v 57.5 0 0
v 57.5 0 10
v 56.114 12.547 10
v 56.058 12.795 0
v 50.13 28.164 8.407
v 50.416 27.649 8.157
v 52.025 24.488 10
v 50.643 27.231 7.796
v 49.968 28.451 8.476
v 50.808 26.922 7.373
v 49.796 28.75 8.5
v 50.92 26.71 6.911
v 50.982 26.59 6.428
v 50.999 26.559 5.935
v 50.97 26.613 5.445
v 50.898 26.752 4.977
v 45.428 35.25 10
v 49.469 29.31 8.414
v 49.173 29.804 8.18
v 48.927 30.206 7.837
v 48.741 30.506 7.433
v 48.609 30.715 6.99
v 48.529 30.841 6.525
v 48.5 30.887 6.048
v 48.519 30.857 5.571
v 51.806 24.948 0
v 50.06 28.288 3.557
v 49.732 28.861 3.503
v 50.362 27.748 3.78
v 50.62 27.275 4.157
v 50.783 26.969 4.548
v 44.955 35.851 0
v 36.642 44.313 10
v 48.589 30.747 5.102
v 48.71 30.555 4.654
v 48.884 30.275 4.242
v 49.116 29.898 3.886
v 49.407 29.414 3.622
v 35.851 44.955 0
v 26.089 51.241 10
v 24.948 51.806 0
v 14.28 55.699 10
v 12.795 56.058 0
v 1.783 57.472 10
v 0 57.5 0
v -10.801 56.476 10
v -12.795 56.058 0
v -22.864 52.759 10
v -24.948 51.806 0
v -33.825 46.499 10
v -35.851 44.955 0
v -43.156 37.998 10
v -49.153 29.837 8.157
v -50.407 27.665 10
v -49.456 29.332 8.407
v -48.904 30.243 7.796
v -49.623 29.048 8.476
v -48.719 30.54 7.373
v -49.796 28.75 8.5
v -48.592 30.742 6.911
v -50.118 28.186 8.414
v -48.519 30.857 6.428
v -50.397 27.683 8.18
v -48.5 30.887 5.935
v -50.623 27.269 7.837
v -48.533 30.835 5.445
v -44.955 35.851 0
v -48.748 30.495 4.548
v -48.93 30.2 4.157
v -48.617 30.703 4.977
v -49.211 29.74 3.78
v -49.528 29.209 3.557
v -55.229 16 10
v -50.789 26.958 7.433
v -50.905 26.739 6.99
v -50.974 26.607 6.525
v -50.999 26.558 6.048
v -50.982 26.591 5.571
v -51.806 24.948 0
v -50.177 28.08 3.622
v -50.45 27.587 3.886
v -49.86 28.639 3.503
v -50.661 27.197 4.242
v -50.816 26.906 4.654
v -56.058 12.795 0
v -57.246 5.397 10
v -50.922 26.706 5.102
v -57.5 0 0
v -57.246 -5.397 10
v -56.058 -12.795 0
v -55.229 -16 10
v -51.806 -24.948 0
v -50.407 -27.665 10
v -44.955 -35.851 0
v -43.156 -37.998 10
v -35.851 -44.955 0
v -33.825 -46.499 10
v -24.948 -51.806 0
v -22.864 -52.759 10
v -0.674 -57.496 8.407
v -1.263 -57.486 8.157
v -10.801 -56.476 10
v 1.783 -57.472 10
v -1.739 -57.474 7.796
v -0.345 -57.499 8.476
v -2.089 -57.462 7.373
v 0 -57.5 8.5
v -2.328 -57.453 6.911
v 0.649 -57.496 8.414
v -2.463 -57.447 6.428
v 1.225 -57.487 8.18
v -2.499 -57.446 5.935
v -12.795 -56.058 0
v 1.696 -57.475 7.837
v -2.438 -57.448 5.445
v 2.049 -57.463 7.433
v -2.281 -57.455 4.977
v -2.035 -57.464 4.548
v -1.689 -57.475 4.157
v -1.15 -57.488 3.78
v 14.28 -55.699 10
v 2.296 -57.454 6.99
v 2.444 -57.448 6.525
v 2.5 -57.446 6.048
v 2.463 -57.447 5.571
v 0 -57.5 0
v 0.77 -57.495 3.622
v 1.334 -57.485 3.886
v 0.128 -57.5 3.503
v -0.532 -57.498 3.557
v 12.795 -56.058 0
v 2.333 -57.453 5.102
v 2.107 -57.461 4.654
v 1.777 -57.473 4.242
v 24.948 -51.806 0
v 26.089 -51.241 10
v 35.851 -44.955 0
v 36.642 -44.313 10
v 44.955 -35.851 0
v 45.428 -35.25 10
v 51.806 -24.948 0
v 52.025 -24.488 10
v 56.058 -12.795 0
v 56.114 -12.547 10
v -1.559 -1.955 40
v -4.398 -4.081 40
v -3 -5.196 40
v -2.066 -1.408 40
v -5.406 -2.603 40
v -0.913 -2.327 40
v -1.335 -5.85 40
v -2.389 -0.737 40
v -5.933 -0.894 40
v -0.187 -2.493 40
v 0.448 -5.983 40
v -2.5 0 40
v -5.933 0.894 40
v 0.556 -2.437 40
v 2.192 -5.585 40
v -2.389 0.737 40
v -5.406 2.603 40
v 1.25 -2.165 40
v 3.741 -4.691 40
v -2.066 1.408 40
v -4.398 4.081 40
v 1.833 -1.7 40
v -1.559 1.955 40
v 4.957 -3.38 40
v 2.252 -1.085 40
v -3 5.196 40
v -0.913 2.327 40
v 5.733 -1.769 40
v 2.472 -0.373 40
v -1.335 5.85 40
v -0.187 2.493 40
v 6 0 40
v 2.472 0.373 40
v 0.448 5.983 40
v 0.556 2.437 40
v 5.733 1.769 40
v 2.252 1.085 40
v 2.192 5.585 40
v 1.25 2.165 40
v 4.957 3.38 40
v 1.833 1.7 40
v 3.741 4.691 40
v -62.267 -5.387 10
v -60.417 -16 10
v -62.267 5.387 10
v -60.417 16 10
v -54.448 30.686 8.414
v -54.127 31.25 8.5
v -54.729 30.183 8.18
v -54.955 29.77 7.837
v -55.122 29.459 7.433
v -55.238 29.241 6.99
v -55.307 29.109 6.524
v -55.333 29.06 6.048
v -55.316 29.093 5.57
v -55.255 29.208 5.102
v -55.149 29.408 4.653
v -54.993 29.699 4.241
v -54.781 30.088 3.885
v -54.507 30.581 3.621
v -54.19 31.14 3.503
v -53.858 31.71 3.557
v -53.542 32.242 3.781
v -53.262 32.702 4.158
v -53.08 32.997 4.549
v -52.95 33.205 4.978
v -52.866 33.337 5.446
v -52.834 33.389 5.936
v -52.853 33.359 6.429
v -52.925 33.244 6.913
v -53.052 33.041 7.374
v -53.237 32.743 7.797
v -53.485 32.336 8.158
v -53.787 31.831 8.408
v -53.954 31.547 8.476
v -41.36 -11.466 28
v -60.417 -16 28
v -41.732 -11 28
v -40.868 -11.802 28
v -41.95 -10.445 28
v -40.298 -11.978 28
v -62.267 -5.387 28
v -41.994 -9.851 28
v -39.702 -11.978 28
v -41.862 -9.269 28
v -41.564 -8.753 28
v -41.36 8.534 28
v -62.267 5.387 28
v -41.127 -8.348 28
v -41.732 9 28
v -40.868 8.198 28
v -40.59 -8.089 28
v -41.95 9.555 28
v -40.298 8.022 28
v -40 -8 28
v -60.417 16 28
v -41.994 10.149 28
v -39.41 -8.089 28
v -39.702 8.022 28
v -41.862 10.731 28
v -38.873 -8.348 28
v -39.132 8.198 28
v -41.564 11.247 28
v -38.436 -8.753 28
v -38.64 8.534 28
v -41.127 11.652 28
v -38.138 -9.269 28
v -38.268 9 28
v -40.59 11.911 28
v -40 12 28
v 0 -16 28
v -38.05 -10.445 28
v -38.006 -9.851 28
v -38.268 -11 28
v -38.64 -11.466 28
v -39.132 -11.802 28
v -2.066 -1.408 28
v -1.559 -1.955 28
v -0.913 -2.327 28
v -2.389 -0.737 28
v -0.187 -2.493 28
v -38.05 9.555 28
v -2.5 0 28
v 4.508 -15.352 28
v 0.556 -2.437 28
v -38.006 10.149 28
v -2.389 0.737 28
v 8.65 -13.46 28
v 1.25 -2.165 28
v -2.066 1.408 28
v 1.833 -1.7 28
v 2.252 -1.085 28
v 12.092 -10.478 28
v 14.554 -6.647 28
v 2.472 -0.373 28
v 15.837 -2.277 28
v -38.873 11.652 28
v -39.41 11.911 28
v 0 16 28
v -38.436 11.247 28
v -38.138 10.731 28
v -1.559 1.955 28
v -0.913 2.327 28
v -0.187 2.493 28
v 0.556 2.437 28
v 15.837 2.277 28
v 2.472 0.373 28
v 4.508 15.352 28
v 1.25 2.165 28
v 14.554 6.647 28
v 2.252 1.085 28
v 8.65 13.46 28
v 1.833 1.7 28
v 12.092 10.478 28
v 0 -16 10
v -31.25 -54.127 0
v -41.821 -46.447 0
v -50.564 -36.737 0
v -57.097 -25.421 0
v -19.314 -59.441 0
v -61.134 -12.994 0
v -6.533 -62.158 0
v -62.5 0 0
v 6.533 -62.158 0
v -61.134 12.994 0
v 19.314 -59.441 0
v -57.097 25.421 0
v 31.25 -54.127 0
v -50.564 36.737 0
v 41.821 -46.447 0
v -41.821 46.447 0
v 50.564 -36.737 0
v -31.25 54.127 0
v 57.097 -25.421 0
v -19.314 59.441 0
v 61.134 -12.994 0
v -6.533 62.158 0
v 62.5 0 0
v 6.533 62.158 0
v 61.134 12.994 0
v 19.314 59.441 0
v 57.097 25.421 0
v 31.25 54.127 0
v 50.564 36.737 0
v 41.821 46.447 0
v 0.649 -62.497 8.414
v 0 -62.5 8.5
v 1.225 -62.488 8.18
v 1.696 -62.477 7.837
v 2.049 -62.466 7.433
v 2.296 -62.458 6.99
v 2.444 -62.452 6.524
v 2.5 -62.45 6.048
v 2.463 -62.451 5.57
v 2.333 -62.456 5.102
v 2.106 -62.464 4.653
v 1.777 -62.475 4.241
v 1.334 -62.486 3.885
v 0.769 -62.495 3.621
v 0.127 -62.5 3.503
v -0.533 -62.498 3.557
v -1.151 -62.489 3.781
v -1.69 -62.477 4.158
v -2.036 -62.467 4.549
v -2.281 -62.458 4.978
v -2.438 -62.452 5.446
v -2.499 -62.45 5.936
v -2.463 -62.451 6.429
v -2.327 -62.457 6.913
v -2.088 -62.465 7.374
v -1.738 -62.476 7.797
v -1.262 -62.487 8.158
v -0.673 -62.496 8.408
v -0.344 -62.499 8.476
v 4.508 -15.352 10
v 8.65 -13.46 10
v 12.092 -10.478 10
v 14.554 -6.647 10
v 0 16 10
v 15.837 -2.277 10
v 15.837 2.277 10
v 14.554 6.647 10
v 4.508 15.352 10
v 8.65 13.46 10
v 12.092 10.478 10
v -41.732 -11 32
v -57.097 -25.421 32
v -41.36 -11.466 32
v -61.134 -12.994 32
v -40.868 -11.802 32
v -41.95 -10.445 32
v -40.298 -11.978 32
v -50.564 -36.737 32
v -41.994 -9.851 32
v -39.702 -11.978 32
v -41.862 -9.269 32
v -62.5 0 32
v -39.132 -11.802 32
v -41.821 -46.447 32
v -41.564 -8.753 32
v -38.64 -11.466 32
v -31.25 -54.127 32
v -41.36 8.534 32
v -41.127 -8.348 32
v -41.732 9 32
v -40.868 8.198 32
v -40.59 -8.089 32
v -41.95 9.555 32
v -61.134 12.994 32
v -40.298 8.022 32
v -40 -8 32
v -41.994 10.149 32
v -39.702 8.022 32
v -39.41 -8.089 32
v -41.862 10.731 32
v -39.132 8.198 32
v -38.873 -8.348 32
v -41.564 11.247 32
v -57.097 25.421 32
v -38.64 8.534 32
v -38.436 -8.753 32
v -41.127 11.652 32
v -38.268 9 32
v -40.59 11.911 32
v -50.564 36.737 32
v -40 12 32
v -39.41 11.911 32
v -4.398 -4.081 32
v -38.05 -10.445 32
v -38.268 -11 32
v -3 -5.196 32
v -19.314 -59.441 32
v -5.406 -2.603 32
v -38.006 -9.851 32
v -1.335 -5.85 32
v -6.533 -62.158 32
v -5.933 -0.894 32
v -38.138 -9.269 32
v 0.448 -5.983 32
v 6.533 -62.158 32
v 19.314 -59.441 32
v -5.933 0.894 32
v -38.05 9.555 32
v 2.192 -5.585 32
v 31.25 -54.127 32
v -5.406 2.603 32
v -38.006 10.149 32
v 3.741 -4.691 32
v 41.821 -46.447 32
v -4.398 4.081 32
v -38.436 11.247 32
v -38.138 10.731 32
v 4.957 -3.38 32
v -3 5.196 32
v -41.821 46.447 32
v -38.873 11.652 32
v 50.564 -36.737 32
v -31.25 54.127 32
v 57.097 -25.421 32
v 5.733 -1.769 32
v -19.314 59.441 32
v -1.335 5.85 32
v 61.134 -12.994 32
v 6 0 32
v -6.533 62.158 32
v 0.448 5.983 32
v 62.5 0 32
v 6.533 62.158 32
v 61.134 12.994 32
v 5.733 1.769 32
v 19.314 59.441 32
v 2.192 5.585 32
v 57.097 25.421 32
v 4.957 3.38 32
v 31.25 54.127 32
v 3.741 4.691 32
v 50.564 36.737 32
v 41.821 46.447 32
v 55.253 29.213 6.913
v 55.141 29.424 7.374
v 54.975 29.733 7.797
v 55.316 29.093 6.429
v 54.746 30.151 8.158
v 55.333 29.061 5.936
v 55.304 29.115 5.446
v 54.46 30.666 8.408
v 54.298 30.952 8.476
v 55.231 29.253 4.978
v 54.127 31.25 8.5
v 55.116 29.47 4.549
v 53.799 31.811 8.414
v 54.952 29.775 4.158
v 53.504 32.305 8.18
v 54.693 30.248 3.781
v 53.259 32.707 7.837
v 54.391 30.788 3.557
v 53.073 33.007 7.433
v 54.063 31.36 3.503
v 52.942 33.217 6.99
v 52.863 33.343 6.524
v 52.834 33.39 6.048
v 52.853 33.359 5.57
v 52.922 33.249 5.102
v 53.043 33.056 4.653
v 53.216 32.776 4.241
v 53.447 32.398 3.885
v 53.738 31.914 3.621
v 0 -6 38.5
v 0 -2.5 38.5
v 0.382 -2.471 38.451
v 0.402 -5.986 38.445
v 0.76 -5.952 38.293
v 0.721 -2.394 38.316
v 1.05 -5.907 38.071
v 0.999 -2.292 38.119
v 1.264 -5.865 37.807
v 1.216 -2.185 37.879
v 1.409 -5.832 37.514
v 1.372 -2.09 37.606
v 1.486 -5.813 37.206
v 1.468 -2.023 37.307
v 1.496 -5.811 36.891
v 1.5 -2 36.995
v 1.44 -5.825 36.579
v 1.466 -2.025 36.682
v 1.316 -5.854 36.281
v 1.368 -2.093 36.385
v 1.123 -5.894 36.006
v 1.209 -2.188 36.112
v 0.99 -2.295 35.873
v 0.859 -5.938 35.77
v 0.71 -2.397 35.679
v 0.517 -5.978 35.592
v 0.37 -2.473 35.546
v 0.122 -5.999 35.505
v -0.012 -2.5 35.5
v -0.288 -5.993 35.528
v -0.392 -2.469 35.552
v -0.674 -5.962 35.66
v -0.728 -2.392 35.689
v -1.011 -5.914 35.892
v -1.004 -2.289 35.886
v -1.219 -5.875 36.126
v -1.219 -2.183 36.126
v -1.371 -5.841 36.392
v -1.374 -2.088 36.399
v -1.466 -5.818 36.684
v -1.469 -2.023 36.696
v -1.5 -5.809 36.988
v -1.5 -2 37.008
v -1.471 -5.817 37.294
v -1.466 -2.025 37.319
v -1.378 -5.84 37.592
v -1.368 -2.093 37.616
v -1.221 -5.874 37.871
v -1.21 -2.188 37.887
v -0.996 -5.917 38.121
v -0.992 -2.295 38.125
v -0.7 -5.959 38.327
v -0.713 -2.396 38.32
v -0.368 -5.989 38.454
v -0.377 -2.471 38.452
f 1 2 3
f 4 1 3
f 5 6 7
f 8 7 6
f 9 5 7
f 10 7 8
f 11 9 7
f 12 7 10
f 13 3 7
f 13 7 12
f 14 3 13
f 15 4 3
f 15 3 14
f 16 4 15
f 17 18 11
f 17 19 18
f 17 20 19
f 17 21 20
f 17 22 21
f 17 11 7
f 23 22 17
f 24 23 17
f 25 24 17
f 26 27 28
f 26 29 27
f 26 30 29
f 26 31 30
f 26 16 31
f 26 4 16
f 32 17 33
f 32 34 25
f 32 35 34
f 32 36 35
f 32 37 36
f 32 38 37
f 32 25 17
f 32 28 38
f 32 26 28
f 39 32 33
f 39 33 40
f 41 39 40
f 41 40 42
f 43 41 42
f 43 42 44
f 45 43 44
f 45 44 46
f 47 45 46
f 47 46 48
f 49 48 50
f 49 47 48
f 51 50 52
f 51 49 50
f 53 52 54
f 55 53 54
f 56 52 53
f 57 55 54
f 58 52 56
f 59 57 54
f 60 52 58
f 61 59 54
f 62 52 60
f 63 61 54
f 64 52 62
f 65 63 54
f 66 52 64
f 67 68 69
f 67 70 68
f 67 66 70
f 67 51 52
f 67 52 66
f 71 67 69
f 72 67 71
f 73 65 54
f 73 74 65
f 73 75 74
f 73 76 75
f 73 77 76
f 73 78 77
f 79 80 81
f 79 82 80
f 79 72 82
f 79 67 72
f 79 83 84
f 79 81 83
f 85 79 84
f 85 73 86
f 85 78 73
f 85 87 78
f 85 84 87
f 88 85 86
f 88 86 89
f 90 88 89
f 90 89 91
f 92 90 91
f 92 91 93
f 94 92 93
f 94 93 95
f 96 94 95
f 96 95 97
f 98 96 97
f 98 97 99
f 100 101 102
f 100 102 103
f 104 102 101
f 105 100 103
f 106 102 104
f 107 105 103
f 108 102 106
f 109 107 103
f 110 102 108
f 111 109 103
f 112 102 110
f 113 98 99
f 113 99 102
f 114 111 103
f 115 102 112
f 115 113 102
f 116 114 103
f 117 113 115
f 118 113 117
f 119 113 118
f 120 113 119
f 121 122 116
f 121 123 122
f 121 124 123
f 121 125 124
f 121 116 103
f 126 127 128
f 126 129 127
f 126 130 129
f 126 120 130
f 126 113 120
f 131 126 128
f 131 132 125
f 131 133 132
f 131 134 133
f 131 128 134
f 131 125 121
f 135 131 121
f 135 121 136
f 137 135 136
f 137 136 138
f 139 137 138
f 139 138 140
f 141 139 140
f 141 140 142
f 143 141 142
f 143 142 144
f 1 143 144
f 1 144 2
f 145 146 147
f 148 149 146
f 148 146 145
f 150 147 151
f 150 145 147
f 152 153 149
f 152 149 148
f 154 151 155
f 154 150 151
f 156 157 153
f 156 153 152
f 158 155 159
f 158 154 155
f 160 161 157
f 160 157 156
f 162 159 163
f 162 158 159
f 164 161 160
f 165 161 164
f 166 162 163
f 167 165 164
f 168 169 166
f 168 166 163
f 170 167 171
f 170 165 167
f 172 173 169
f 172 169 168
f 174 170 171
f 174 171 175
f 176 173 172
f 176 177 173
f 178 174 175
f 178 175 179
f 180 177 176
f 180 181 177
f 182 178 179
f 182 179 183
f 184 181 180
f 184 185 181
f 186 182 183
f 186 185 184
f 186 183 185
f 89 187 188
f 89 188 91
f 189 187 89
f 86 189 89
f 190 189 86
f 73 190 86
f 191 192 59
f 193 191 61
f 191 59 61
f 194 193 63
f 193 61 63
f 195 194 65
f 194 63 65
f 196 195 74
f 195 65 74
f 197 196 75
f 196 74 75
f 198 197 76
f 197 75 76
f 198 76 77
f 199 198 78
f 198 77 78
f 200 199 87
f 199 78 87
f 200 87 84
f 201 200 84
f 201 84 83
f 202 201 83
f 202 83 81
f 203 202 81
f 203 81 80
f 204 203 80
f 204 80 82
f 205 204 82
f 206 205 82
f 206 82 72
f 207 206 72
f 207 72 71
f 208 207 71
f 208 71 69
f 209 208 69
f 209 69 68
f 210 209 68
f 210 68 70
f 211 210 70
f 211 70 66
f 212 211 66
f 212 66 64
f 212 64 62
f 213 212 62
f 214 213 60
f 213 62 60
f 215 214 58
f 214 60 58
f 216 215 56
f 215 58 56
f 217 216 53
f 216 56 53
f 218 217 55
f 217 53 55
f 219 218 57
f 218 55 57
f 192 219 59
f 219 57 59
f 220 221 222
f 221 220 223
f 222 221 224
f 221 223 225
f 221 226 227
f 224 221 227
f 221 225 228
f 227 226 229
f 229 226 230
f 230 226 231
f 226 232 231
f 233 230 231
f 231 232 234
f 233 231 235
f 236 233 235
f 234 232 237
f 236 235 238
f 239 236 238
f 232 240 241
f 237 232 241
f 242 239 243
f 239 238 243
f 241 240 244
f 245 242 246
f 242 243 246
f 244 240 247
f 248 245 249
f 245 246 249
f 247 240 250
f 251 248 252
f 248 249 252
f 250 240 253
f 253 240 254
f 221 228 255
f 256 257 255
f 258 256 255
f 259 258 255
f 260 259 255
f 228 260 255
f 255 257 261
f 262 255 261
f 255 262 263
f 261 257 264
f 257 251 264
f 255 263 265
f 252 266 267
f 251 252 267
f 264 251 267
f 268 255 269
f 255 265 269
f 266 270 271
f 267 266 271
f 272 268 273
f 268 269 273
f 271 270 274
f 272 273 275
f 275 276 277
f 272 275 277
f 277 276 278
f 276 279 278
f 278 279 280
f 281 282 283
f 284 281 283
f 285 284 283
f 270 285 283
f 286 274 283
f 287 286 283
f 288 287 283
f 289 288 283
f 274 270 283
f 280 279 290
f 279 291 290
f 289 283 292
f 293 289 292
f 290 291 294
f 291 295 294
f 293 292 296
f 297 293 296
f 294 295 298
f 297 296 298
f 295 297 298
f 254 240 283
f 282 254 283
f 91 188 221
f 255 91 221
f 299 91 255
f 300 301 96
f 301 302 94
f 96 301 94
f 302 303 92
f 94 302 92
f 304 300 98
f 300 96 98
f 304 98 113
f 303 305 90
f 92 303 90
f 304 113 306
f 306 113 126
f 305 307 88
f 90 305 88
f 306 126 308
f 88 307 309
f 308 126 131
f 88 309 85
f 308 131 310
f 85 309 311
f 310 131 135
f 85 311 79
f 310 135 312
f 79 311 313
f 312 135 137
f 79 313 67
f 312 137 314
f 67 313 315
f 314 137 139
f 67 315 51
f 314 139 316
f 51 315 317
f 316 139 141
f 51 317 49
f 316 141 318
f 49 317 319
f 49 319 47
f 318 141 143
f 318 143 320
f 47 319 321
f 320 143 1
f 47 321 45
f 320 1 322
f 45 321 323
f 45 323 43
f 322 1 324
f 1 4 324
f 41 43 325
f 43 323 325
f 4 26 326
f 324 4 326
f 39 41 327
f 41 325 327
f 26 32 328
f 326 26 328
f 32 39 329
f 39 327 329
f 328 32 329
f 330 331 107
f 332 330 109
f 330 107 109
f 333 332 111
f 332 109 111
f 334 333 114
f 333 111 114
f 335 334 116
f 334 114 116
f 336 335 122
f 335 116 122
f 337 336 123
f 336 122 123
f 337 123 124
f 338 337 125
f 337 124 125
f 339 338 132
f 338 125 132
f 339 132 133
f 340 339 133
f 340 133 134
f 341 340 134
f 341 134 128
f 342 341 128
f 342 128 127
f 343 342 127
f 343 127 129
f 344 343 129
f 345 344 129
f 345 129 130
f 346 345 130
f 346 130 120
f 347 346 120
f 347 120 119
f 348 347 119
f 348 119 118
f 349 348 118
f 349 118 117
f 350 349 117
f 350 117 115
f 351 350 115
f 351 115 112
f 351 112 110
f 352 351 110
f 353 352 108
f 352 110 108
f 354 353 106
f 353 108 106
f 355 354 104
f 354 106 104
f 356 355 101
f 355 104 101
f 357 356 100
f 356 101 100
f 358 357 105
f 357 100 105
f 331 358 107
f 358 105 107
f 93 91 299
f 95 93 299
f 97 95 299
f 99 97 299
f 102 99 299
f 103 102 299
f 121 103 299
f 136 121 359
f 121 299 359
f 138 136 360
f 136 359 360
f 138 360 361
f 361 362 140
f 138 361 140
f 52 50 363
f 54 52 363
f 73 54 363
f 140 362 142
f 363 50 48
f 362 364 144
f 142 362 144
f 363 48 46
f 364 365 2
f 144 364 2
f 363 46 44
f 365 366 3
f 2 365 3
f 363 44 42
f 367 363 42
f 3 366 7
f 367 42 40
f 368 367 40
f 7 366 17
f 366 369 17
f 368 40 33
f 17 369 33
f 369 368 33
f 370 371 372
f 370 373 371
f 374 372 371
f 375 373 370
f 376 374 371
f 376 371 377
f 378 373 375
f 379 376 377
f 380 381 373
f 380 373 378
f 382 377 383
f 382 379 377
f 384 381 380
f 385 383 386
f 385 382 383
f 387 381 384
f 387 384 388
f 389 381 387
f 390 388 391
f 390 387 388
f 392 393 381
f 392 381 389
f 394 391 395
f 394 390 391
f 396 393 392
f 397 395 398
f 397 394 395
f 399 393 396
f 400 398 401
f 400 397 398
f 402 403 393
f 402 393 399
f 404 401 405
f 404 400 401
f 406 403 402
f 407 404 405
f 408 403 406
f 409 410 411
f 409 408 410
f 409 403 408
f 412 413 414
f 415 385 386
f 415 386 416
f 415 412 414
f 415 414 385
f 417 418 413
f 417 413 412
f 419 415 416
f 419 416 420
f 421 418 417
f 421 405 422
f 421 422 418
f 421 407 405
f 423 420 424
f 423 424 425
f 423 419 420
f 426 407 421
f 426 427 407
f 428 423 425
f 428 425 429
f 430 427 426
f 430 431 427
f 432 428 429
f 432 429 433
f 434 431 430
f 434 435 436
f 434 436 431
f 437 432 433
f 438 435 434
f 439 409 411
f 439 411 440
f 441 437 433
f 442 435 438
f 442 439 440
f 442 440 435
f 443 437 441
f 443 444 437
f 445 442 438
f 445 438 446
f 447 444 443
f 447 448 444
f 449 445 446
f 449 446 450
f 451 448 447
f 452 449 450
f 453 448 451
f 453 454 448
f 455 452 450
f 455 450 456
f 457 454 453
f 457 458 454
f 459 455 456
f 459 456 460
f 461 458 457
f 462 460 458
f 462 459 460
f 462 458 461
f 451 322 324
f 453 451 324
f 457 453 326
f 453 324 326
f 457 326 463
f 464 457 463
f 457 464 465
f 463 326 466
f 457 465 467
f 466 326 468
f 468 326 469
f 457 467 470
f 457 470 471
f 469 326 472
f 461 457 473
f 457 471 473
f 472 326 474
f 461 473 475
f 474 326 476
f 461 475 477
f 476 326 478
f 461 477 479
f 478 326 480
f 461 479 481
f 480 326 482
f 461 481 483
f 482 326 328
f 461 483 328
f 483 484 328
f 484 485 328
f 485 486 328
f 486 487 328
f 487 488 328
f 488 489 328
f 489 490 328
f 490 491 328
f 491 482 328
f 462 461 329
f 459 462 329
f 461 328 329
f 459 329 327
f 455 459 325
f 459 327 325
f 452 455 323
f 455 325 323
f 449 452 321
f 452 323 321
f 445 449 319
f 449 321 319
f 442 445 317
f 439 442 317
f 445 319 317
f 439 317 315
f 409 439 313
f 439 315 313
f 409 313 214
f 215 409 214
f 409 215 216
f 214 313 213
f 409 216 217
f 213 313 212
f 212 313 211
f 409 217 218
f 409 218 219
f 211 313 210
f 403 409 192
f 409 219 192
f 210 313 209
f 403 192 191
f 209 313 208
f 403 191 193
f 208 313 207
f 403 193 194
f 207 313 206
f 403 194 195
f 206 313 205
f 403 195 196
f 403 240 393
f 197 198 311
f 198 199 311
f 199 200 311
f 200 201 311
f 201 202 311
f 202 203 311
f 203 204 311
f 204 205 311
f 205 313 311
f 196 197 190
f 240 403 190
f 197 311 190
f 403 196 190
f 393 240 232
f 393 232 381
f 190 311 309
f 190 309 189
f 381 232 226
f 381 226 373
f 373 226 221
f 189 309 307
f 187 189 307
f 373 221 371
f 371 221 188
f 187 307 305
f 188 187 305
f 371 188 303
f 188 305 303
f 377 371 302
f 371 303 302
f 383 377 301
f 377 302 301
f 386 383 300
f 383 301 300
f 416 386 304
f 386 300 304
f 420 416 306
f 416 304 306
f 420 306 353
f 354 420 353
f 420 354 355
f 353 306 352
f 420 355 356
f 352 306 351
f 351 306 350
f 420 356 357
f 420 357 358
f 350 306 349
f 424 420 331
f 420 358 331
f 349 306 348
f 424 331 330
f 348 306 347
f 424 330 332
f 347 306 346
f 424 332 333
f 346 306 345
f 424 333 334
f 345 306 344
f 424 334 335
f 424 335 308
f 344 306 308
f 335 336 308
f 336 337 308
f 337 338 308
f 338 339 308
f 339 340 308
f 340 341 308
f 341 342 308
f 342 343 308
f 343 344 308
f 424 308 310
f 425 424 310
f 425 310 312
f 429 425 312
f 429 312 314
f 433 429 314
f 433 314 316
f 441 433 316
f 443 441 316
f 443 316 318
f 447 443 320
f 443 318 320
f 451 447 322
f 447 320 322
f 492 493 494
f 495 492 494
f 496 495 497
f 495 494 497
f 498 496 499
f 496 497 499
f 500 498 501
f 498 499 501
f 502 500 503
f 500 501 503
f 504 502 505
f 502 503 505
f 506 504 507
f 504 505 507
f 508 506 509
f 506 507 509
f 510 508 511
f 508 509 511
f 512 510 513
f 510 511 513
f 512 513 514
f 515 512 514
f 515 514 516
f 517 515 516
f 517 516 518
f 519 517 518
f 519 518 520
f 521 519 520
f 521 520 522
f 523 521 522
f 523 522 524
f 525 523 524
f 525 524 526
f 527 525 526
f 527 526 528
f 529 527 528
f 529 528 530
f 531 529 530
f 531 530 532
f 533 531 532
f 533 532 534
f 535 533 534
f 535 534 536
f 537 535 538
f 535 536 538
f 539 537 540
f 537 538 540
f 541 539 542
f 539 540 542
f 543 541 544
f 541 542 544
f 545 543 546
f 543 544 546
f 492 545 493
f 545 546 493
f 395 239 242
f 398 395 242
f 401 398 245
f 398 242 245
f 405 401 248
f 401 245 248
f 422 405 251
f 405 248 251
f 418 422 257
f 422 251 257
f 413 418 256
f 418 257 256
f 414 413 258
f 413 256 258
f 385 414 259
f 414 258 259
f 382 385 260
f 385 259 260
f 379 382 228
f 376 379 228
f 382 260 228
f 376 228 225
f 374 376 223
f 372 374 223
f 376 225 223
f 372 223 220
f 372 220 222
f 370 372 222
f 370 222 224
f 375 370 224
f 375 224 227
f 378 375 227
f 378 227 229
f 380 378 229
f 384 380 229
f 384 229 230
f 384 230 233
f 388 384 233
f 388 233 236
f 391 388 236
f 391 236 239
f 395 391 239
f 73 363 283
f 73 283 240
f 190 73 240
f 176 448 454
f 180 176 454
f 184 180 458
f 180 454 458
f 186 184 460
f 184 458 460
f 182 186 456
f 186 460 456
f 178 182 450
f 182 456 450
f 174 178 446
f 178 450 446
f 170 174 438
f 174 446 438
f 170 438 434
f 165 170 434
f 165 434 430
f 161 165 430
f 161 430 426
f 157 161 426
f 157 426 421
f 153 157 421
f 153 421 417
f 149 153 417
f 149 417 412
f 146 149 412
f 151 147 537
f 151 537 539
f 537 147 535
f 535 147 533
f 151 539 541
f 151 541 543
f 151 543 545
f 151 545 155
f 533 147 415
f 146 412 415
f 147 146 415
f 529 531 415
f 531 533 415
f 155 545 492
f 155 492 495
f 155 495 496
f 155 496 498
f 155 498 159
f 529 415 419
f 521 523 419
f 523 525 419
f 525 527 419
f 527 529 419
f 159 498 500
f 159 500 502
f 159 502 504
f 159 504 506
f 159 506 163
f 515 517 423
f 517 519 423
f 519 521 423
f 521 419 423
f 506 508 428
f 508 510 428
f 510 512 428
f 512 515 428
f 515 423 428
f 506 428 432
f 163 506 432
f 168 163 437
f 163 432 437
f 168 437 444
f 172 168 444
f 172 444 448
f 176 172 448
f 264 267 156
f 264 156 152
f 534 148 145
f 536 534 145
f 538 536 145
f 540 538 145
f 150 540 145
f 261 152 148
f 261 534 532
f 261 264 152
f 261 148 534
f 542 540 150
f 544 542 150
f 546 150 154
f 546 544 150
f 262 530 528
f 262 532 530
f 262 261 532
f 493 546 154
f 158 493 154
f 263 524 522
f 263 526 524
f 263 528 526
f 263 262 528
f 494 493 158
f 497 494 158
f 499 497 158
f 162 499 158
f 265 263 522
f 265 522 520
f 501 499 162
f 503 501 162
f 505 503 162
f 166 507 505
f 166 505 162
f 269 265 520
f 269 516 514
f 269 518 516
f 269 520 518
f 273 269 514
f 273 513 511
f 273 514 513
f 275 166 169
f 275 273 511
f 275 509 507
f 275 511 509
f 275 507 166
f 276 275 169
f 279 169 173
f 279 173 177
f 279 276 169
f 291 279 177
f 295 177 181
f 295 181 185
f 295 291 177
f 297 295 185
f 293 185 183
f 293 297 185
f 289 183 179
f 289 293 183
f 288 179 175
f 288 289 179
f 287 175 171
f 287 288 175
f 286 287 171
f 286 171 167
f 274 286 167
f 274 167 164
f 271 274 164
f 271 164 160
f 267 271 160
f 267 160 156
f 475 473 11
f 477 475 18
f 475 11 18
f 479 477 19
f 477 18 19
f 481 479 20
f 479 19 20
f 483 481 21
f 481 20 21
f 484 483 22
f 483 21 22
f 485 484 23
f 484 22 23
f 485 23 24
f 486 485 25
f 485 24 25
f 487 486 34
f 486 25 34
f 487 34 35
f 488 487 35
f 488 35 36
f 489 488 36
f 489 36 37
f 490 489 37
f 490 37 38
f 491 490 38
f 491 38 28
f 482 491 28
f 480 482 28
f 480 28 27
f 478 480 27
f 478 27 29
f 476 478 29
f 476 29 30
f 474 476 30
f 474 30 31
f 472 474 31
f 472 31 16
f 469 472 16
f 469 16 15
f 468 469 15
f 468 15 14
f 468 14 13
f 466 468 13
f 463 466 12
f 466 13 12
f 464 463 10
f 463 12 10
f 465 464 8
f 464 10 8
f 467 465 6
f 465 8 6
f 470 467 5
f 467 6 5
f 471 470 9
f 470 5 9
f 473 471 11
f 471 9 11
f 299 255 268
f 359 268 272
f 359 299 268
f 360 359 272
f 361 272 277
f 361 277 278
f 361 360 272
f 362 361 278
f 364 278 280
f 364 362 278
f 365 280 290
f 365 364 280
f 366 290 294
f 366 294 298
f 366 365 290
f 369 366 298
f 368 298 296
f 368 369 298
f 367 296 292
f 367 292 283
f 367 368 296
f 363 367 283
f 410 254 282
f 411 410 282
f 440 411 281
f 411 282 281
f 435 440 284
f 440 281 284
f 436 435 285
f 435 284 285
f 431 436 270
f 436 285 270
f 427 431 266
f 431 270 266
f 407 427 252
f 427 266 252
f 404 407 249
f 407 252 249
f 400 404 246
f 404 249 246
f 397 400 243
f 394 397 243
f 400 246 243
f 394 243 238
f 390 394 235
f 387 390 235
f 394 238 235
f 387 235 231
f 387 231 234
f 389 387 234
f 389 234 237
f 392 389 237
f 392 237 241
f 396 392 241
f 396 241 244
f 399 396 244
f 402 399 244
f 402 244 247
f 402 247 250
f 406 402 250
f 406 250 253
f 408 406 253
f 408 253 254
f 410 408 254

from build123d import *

# Parameters (mm, degrees)
SKETCH1_R           = 62.5
SKETCH1_R_2         = 57.5
BOSS_EXTRUDE1_DEPTH = 10
SKETCH2_R           = 62.5
BOSS_EXTRUDE2_DEPTH = 22
SKETCH3_R           = 2.5
CUT_EXTRUDE1_DEPTH  = 92.08512502
CUT_EXTRUDE2_DEPTH  = 18
SKETCH5_R           = 6
SKETCH5_R_2         = 2.5
BOSS_EXTRUDE3_DEPTH = 8
SKETCH6_R           = 1.5
CUT_EXTRUDE3_DEPTH  = 98.01803956
SKETCH7_R           = 2.5
CUT_EXTRUDE4_DEPTH  = 98.018039601
CIRPATTERN1_COUNT   = 3
SKETCH8_R           = 2
CUT_EXTRUDE5_DEPTH  = 93.717312465


with BuildPart() as part:
    # Sketch1 → Boss-Extrude1 (new body)
    with BuildSketch(Plane.XY):
        Circle(SKETCH1_R)
        Circle(SKETCH1_R_2, mode=Mode.SUBTRACT)
    extrude(amount=BOSS_EXTRUDE1_DEPTH)

    # Sketch2 → Boss-Extrude2 (add)
    with BuildSketch(Plane.XY.offset(10)):
        Circle(SKETCH2_R)
    extrude(amount=BOSS_EXTRUDE2_DEPTH)

    # Sketch3 → Cut-Extrude1 (cut, through all)
    with BuildSketch(Plane(origin=(0, 0, 10), x_dir=(-1, 0, 0), z_dir=(0, 0, -1))):
        Circle(SKETCH3_R)
    extrude(amount=-CUT_EXTRUDE1_DEPTH, mode=Mode.SUBTRACT)

    # Sketch4 → Cut-Extrude2 (cut)
    with BuildSketch(Plane(origin=(0, 0, 10), x_dir=(-1, 0, 0), z_dir=(0, 0, -1))):
        with BuildLine():
            Line((0, 16), (74.659744803, 16))
            Line((74.659744803, 16), (74.659744803, -16))
            Line((74.659744803, -16), (0, -16))
            ThreePointArc((0, -16), (-16, 0), (0, 16))
        make_face()
    extrude(amount=-CUT_EXTRUDE2_DEPTH, mode=Mode.SUBTRACT)

    # Sketch5 → Boss-Extrude3 (add)
    with BuildSketch(Plane.XY.offset(32)):
        Circle(SKETCH5_R)
        with Locations(Location((0, 0, 0), (0, 0, 180))):
            Circle(SKETCH5_R_2, mode=Mode.SUBTRACT)
    extrude(amount=BOSS_EXTRUDE3_DEPTH)

    # Sketch6 → Cut-Extrude3 (cut, through all)
    with BuildSketch(Plane(origin=(0, 0, 0), x_dir=(1, 0, 0), z_dir=(0, 1, 0))):
        with Locations(Location((0, -37, 0), (0, 0, 270))):
            Circle(SKETCH6_R)
    extrude(amount=-CUT_EXTRUDE3_DEPTH, mode=Mode.SUBTRACT)

    # Sketch7 → Cut-Extrude4 (cut, through all)
    with BuildSketch(Plane(origin=(0, 0, 0), x_dir=(1, 0, 0), z_dir=(0, 1, 0))):
        with Locations(Location((0, -6, 0), (0, 0, 270))):
            Circle(SKETCH7_R)
    cut_extrude4 = extrude(amount=-CUT_EXTRUDE4_DEPTH, mode=Mode.SUBTRACT)

    # CirPattern1: Cut-Extrude4 ×3 about axis
    cirpattern1_axis = Axis((0, 0, 0), (0, 0, 1))
    for i in range(1, CIRPATTERN1_COUNT):
        add(cut_extrude4.rotate(cirpattern1_axis, i * 360 / CIRPATTERN1_COUNT), mode=Mode.SUBTRACT)

    # Sketch8 → Cut-Extrude5 (cut, through all)
    with BuildSketch(Plane(origin=(0, 0, 28), x_dir=(-1, 0, 0), z_dir=(0, 0, -1))):
        with Locations(Location((40, 10, 0), (0, 0, 90))):
            Circle(SKETCH8_R)
        with Locations(Location((40, -10, 0), (0, 0, 90))):
            Circle(SKETCH8_R)
    extrude(amount=-CUT_EXTRUDE5_DEPTH, mode=Mode.SUBTRACT)


solid = part.part
